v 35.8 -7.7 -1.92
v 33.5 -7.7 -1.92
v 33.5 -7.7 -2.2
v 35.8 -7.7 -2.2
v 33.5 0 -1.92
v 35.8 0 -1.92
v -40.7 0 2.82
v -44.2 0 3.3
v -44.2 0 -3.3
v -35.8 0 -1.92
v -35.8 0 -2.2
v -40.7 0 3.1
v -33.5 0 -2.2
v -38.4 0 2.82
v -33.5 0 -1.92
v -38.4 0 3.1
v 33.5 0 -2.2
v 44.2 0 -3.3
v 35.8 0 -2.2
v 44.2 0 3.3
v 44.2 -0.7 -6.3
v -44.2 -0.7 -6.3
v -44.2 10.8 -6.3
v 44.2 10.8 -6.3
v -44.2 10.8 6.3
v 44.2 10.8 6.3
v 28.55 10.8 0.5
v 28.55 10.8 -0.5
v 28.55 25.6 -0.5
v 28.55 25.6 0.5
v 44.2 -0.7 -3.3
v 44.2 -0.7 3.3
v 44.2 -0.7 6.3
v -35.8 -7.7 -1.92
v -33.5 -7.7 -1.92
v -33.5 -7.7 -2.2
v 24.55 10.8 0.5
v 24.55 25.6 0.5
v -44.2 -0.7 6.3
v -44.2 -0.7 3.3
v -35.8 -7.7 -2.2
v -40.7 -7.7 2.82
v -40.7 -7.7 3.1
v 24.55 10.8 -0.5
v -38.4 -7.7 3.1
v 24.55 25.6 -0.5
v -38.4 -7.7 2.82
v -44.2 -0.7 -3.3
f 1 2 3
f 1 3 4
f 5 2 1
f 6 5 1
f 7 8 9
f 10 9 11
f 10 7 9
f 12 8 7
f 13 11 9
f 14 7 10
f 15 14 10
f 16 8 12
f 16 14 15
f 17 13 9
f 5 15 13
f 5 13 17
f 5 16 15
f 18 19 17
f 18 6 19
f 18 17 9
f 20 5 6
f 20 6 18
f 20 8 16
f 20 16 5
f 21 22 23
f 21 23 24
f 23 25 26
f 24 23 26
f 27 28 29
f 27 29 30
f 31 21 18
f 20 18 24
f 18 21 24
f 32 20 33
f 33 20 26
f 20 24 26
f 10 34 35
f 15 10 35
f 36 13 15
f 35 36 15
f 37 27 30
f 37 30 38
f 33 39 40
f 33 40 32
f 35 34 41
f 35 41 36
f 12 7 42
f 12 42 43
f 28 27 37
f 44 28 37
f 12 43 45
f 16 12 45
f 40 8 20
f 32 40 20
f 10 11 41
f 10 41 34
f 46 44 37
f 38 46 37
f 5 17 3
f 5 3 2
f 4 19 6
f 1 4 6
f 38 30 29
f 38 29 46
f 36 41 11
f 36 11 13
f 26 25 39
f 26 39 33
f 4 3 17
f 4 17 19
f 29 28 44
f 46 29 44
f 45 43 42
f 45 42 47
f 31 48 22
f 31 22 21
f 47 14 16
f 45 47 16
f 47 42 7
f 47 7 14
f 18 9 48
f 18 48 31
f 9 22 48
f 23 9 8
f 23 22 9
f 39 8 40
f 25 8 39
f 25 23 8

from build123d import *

# Parameters (mm, degrees)
F0_W     = 88.4
F0_H     = 6.6
F0_W_2   = 2.3
F0_H_2   = 0.28
F0_H_3   = 3
F1_DEPTH = 10.8
F2_DEPTH = 7.7
F3_DEPTH = 0.7
F4_W     = 4
F4_H     = 1
F5_DEPTH = 14.8


with BuildPart() as f1:
    # F0 (on Front) → F1 (new body)
    with BuildSketch(Plane.XZ):
        Rectangle(F0_W, F0_H)
        with Locations((-34.65, -2.06)):
            Rectangle(F0_W_2, F0_H_2, mode=Mode.SUBTRACT)
        with Locations((34.65, -2.06)):
            Rectangle(F0_W_2, F0_H_2, mode=Mode.SUBTRACT)
        with Locations((-39.55, 2.96)):
            Rectangle(F0_W_2, F0_H_2, mode=Mode.SUBTRACT)
        with Locations((0, 4.8)):
            Rectangle(F0_W, F0_H_3)
        with Locations((0, -4.8)):
            Rectangle(F0_W, F0_H_3)
        with Locations((-39.55, 2.96)):
            Rectangle(F0_W_2, F0_H_2)
        with Locations((-34.65, -2.06)):
            Rectangle(F0_W_2, F0_H_2)
        with Locations((34.65, -2.06)):
            Rectangle(F0_W_2, F0_H_2)
    extrude(amount=-F1_DEPTH)

    # F0 (on Front) → F2 (join)
    with BuildSketch(Plane.XZ):
        with Locations((34.65, -2.06)):
            Rectangle(F0_W_2, F0_H_2)
        with Locations((-39.55, 2.96)):
            Rectangle(F0_W_2, F0_H_2)
        with Locations((-34.65, -2.06)):
            Rectangle(F0_W_2, F0_H_2)
    extrude(amount=F2_DEPTH)

    # F0 (on Front) → F3 (join)
    with BuildSketch(Plane.XZ):
        with Locations((0, 4.8)):
            Rectangle(F0_W, F0_H_3)
        with Locations((0, -4.8)):
            Rectangle(F0_W, F0_H_3)
    extrude(amount=F3_DEPTH)


with BuildPart() as f5:
    # F4 (on face) → F5 (new body)
    with BuildSketch(Plane(origin=(0, 10.8, 0), x_dir=(-1, 0, 0), z_dir=(0, 1, 0))):
        with Locations((-26.55, 0)):
            Rectangle(F4_W, F4_H)
    extrude(amount=F5_DEPTH)


solid = Compound([f1.part, f5.part])
